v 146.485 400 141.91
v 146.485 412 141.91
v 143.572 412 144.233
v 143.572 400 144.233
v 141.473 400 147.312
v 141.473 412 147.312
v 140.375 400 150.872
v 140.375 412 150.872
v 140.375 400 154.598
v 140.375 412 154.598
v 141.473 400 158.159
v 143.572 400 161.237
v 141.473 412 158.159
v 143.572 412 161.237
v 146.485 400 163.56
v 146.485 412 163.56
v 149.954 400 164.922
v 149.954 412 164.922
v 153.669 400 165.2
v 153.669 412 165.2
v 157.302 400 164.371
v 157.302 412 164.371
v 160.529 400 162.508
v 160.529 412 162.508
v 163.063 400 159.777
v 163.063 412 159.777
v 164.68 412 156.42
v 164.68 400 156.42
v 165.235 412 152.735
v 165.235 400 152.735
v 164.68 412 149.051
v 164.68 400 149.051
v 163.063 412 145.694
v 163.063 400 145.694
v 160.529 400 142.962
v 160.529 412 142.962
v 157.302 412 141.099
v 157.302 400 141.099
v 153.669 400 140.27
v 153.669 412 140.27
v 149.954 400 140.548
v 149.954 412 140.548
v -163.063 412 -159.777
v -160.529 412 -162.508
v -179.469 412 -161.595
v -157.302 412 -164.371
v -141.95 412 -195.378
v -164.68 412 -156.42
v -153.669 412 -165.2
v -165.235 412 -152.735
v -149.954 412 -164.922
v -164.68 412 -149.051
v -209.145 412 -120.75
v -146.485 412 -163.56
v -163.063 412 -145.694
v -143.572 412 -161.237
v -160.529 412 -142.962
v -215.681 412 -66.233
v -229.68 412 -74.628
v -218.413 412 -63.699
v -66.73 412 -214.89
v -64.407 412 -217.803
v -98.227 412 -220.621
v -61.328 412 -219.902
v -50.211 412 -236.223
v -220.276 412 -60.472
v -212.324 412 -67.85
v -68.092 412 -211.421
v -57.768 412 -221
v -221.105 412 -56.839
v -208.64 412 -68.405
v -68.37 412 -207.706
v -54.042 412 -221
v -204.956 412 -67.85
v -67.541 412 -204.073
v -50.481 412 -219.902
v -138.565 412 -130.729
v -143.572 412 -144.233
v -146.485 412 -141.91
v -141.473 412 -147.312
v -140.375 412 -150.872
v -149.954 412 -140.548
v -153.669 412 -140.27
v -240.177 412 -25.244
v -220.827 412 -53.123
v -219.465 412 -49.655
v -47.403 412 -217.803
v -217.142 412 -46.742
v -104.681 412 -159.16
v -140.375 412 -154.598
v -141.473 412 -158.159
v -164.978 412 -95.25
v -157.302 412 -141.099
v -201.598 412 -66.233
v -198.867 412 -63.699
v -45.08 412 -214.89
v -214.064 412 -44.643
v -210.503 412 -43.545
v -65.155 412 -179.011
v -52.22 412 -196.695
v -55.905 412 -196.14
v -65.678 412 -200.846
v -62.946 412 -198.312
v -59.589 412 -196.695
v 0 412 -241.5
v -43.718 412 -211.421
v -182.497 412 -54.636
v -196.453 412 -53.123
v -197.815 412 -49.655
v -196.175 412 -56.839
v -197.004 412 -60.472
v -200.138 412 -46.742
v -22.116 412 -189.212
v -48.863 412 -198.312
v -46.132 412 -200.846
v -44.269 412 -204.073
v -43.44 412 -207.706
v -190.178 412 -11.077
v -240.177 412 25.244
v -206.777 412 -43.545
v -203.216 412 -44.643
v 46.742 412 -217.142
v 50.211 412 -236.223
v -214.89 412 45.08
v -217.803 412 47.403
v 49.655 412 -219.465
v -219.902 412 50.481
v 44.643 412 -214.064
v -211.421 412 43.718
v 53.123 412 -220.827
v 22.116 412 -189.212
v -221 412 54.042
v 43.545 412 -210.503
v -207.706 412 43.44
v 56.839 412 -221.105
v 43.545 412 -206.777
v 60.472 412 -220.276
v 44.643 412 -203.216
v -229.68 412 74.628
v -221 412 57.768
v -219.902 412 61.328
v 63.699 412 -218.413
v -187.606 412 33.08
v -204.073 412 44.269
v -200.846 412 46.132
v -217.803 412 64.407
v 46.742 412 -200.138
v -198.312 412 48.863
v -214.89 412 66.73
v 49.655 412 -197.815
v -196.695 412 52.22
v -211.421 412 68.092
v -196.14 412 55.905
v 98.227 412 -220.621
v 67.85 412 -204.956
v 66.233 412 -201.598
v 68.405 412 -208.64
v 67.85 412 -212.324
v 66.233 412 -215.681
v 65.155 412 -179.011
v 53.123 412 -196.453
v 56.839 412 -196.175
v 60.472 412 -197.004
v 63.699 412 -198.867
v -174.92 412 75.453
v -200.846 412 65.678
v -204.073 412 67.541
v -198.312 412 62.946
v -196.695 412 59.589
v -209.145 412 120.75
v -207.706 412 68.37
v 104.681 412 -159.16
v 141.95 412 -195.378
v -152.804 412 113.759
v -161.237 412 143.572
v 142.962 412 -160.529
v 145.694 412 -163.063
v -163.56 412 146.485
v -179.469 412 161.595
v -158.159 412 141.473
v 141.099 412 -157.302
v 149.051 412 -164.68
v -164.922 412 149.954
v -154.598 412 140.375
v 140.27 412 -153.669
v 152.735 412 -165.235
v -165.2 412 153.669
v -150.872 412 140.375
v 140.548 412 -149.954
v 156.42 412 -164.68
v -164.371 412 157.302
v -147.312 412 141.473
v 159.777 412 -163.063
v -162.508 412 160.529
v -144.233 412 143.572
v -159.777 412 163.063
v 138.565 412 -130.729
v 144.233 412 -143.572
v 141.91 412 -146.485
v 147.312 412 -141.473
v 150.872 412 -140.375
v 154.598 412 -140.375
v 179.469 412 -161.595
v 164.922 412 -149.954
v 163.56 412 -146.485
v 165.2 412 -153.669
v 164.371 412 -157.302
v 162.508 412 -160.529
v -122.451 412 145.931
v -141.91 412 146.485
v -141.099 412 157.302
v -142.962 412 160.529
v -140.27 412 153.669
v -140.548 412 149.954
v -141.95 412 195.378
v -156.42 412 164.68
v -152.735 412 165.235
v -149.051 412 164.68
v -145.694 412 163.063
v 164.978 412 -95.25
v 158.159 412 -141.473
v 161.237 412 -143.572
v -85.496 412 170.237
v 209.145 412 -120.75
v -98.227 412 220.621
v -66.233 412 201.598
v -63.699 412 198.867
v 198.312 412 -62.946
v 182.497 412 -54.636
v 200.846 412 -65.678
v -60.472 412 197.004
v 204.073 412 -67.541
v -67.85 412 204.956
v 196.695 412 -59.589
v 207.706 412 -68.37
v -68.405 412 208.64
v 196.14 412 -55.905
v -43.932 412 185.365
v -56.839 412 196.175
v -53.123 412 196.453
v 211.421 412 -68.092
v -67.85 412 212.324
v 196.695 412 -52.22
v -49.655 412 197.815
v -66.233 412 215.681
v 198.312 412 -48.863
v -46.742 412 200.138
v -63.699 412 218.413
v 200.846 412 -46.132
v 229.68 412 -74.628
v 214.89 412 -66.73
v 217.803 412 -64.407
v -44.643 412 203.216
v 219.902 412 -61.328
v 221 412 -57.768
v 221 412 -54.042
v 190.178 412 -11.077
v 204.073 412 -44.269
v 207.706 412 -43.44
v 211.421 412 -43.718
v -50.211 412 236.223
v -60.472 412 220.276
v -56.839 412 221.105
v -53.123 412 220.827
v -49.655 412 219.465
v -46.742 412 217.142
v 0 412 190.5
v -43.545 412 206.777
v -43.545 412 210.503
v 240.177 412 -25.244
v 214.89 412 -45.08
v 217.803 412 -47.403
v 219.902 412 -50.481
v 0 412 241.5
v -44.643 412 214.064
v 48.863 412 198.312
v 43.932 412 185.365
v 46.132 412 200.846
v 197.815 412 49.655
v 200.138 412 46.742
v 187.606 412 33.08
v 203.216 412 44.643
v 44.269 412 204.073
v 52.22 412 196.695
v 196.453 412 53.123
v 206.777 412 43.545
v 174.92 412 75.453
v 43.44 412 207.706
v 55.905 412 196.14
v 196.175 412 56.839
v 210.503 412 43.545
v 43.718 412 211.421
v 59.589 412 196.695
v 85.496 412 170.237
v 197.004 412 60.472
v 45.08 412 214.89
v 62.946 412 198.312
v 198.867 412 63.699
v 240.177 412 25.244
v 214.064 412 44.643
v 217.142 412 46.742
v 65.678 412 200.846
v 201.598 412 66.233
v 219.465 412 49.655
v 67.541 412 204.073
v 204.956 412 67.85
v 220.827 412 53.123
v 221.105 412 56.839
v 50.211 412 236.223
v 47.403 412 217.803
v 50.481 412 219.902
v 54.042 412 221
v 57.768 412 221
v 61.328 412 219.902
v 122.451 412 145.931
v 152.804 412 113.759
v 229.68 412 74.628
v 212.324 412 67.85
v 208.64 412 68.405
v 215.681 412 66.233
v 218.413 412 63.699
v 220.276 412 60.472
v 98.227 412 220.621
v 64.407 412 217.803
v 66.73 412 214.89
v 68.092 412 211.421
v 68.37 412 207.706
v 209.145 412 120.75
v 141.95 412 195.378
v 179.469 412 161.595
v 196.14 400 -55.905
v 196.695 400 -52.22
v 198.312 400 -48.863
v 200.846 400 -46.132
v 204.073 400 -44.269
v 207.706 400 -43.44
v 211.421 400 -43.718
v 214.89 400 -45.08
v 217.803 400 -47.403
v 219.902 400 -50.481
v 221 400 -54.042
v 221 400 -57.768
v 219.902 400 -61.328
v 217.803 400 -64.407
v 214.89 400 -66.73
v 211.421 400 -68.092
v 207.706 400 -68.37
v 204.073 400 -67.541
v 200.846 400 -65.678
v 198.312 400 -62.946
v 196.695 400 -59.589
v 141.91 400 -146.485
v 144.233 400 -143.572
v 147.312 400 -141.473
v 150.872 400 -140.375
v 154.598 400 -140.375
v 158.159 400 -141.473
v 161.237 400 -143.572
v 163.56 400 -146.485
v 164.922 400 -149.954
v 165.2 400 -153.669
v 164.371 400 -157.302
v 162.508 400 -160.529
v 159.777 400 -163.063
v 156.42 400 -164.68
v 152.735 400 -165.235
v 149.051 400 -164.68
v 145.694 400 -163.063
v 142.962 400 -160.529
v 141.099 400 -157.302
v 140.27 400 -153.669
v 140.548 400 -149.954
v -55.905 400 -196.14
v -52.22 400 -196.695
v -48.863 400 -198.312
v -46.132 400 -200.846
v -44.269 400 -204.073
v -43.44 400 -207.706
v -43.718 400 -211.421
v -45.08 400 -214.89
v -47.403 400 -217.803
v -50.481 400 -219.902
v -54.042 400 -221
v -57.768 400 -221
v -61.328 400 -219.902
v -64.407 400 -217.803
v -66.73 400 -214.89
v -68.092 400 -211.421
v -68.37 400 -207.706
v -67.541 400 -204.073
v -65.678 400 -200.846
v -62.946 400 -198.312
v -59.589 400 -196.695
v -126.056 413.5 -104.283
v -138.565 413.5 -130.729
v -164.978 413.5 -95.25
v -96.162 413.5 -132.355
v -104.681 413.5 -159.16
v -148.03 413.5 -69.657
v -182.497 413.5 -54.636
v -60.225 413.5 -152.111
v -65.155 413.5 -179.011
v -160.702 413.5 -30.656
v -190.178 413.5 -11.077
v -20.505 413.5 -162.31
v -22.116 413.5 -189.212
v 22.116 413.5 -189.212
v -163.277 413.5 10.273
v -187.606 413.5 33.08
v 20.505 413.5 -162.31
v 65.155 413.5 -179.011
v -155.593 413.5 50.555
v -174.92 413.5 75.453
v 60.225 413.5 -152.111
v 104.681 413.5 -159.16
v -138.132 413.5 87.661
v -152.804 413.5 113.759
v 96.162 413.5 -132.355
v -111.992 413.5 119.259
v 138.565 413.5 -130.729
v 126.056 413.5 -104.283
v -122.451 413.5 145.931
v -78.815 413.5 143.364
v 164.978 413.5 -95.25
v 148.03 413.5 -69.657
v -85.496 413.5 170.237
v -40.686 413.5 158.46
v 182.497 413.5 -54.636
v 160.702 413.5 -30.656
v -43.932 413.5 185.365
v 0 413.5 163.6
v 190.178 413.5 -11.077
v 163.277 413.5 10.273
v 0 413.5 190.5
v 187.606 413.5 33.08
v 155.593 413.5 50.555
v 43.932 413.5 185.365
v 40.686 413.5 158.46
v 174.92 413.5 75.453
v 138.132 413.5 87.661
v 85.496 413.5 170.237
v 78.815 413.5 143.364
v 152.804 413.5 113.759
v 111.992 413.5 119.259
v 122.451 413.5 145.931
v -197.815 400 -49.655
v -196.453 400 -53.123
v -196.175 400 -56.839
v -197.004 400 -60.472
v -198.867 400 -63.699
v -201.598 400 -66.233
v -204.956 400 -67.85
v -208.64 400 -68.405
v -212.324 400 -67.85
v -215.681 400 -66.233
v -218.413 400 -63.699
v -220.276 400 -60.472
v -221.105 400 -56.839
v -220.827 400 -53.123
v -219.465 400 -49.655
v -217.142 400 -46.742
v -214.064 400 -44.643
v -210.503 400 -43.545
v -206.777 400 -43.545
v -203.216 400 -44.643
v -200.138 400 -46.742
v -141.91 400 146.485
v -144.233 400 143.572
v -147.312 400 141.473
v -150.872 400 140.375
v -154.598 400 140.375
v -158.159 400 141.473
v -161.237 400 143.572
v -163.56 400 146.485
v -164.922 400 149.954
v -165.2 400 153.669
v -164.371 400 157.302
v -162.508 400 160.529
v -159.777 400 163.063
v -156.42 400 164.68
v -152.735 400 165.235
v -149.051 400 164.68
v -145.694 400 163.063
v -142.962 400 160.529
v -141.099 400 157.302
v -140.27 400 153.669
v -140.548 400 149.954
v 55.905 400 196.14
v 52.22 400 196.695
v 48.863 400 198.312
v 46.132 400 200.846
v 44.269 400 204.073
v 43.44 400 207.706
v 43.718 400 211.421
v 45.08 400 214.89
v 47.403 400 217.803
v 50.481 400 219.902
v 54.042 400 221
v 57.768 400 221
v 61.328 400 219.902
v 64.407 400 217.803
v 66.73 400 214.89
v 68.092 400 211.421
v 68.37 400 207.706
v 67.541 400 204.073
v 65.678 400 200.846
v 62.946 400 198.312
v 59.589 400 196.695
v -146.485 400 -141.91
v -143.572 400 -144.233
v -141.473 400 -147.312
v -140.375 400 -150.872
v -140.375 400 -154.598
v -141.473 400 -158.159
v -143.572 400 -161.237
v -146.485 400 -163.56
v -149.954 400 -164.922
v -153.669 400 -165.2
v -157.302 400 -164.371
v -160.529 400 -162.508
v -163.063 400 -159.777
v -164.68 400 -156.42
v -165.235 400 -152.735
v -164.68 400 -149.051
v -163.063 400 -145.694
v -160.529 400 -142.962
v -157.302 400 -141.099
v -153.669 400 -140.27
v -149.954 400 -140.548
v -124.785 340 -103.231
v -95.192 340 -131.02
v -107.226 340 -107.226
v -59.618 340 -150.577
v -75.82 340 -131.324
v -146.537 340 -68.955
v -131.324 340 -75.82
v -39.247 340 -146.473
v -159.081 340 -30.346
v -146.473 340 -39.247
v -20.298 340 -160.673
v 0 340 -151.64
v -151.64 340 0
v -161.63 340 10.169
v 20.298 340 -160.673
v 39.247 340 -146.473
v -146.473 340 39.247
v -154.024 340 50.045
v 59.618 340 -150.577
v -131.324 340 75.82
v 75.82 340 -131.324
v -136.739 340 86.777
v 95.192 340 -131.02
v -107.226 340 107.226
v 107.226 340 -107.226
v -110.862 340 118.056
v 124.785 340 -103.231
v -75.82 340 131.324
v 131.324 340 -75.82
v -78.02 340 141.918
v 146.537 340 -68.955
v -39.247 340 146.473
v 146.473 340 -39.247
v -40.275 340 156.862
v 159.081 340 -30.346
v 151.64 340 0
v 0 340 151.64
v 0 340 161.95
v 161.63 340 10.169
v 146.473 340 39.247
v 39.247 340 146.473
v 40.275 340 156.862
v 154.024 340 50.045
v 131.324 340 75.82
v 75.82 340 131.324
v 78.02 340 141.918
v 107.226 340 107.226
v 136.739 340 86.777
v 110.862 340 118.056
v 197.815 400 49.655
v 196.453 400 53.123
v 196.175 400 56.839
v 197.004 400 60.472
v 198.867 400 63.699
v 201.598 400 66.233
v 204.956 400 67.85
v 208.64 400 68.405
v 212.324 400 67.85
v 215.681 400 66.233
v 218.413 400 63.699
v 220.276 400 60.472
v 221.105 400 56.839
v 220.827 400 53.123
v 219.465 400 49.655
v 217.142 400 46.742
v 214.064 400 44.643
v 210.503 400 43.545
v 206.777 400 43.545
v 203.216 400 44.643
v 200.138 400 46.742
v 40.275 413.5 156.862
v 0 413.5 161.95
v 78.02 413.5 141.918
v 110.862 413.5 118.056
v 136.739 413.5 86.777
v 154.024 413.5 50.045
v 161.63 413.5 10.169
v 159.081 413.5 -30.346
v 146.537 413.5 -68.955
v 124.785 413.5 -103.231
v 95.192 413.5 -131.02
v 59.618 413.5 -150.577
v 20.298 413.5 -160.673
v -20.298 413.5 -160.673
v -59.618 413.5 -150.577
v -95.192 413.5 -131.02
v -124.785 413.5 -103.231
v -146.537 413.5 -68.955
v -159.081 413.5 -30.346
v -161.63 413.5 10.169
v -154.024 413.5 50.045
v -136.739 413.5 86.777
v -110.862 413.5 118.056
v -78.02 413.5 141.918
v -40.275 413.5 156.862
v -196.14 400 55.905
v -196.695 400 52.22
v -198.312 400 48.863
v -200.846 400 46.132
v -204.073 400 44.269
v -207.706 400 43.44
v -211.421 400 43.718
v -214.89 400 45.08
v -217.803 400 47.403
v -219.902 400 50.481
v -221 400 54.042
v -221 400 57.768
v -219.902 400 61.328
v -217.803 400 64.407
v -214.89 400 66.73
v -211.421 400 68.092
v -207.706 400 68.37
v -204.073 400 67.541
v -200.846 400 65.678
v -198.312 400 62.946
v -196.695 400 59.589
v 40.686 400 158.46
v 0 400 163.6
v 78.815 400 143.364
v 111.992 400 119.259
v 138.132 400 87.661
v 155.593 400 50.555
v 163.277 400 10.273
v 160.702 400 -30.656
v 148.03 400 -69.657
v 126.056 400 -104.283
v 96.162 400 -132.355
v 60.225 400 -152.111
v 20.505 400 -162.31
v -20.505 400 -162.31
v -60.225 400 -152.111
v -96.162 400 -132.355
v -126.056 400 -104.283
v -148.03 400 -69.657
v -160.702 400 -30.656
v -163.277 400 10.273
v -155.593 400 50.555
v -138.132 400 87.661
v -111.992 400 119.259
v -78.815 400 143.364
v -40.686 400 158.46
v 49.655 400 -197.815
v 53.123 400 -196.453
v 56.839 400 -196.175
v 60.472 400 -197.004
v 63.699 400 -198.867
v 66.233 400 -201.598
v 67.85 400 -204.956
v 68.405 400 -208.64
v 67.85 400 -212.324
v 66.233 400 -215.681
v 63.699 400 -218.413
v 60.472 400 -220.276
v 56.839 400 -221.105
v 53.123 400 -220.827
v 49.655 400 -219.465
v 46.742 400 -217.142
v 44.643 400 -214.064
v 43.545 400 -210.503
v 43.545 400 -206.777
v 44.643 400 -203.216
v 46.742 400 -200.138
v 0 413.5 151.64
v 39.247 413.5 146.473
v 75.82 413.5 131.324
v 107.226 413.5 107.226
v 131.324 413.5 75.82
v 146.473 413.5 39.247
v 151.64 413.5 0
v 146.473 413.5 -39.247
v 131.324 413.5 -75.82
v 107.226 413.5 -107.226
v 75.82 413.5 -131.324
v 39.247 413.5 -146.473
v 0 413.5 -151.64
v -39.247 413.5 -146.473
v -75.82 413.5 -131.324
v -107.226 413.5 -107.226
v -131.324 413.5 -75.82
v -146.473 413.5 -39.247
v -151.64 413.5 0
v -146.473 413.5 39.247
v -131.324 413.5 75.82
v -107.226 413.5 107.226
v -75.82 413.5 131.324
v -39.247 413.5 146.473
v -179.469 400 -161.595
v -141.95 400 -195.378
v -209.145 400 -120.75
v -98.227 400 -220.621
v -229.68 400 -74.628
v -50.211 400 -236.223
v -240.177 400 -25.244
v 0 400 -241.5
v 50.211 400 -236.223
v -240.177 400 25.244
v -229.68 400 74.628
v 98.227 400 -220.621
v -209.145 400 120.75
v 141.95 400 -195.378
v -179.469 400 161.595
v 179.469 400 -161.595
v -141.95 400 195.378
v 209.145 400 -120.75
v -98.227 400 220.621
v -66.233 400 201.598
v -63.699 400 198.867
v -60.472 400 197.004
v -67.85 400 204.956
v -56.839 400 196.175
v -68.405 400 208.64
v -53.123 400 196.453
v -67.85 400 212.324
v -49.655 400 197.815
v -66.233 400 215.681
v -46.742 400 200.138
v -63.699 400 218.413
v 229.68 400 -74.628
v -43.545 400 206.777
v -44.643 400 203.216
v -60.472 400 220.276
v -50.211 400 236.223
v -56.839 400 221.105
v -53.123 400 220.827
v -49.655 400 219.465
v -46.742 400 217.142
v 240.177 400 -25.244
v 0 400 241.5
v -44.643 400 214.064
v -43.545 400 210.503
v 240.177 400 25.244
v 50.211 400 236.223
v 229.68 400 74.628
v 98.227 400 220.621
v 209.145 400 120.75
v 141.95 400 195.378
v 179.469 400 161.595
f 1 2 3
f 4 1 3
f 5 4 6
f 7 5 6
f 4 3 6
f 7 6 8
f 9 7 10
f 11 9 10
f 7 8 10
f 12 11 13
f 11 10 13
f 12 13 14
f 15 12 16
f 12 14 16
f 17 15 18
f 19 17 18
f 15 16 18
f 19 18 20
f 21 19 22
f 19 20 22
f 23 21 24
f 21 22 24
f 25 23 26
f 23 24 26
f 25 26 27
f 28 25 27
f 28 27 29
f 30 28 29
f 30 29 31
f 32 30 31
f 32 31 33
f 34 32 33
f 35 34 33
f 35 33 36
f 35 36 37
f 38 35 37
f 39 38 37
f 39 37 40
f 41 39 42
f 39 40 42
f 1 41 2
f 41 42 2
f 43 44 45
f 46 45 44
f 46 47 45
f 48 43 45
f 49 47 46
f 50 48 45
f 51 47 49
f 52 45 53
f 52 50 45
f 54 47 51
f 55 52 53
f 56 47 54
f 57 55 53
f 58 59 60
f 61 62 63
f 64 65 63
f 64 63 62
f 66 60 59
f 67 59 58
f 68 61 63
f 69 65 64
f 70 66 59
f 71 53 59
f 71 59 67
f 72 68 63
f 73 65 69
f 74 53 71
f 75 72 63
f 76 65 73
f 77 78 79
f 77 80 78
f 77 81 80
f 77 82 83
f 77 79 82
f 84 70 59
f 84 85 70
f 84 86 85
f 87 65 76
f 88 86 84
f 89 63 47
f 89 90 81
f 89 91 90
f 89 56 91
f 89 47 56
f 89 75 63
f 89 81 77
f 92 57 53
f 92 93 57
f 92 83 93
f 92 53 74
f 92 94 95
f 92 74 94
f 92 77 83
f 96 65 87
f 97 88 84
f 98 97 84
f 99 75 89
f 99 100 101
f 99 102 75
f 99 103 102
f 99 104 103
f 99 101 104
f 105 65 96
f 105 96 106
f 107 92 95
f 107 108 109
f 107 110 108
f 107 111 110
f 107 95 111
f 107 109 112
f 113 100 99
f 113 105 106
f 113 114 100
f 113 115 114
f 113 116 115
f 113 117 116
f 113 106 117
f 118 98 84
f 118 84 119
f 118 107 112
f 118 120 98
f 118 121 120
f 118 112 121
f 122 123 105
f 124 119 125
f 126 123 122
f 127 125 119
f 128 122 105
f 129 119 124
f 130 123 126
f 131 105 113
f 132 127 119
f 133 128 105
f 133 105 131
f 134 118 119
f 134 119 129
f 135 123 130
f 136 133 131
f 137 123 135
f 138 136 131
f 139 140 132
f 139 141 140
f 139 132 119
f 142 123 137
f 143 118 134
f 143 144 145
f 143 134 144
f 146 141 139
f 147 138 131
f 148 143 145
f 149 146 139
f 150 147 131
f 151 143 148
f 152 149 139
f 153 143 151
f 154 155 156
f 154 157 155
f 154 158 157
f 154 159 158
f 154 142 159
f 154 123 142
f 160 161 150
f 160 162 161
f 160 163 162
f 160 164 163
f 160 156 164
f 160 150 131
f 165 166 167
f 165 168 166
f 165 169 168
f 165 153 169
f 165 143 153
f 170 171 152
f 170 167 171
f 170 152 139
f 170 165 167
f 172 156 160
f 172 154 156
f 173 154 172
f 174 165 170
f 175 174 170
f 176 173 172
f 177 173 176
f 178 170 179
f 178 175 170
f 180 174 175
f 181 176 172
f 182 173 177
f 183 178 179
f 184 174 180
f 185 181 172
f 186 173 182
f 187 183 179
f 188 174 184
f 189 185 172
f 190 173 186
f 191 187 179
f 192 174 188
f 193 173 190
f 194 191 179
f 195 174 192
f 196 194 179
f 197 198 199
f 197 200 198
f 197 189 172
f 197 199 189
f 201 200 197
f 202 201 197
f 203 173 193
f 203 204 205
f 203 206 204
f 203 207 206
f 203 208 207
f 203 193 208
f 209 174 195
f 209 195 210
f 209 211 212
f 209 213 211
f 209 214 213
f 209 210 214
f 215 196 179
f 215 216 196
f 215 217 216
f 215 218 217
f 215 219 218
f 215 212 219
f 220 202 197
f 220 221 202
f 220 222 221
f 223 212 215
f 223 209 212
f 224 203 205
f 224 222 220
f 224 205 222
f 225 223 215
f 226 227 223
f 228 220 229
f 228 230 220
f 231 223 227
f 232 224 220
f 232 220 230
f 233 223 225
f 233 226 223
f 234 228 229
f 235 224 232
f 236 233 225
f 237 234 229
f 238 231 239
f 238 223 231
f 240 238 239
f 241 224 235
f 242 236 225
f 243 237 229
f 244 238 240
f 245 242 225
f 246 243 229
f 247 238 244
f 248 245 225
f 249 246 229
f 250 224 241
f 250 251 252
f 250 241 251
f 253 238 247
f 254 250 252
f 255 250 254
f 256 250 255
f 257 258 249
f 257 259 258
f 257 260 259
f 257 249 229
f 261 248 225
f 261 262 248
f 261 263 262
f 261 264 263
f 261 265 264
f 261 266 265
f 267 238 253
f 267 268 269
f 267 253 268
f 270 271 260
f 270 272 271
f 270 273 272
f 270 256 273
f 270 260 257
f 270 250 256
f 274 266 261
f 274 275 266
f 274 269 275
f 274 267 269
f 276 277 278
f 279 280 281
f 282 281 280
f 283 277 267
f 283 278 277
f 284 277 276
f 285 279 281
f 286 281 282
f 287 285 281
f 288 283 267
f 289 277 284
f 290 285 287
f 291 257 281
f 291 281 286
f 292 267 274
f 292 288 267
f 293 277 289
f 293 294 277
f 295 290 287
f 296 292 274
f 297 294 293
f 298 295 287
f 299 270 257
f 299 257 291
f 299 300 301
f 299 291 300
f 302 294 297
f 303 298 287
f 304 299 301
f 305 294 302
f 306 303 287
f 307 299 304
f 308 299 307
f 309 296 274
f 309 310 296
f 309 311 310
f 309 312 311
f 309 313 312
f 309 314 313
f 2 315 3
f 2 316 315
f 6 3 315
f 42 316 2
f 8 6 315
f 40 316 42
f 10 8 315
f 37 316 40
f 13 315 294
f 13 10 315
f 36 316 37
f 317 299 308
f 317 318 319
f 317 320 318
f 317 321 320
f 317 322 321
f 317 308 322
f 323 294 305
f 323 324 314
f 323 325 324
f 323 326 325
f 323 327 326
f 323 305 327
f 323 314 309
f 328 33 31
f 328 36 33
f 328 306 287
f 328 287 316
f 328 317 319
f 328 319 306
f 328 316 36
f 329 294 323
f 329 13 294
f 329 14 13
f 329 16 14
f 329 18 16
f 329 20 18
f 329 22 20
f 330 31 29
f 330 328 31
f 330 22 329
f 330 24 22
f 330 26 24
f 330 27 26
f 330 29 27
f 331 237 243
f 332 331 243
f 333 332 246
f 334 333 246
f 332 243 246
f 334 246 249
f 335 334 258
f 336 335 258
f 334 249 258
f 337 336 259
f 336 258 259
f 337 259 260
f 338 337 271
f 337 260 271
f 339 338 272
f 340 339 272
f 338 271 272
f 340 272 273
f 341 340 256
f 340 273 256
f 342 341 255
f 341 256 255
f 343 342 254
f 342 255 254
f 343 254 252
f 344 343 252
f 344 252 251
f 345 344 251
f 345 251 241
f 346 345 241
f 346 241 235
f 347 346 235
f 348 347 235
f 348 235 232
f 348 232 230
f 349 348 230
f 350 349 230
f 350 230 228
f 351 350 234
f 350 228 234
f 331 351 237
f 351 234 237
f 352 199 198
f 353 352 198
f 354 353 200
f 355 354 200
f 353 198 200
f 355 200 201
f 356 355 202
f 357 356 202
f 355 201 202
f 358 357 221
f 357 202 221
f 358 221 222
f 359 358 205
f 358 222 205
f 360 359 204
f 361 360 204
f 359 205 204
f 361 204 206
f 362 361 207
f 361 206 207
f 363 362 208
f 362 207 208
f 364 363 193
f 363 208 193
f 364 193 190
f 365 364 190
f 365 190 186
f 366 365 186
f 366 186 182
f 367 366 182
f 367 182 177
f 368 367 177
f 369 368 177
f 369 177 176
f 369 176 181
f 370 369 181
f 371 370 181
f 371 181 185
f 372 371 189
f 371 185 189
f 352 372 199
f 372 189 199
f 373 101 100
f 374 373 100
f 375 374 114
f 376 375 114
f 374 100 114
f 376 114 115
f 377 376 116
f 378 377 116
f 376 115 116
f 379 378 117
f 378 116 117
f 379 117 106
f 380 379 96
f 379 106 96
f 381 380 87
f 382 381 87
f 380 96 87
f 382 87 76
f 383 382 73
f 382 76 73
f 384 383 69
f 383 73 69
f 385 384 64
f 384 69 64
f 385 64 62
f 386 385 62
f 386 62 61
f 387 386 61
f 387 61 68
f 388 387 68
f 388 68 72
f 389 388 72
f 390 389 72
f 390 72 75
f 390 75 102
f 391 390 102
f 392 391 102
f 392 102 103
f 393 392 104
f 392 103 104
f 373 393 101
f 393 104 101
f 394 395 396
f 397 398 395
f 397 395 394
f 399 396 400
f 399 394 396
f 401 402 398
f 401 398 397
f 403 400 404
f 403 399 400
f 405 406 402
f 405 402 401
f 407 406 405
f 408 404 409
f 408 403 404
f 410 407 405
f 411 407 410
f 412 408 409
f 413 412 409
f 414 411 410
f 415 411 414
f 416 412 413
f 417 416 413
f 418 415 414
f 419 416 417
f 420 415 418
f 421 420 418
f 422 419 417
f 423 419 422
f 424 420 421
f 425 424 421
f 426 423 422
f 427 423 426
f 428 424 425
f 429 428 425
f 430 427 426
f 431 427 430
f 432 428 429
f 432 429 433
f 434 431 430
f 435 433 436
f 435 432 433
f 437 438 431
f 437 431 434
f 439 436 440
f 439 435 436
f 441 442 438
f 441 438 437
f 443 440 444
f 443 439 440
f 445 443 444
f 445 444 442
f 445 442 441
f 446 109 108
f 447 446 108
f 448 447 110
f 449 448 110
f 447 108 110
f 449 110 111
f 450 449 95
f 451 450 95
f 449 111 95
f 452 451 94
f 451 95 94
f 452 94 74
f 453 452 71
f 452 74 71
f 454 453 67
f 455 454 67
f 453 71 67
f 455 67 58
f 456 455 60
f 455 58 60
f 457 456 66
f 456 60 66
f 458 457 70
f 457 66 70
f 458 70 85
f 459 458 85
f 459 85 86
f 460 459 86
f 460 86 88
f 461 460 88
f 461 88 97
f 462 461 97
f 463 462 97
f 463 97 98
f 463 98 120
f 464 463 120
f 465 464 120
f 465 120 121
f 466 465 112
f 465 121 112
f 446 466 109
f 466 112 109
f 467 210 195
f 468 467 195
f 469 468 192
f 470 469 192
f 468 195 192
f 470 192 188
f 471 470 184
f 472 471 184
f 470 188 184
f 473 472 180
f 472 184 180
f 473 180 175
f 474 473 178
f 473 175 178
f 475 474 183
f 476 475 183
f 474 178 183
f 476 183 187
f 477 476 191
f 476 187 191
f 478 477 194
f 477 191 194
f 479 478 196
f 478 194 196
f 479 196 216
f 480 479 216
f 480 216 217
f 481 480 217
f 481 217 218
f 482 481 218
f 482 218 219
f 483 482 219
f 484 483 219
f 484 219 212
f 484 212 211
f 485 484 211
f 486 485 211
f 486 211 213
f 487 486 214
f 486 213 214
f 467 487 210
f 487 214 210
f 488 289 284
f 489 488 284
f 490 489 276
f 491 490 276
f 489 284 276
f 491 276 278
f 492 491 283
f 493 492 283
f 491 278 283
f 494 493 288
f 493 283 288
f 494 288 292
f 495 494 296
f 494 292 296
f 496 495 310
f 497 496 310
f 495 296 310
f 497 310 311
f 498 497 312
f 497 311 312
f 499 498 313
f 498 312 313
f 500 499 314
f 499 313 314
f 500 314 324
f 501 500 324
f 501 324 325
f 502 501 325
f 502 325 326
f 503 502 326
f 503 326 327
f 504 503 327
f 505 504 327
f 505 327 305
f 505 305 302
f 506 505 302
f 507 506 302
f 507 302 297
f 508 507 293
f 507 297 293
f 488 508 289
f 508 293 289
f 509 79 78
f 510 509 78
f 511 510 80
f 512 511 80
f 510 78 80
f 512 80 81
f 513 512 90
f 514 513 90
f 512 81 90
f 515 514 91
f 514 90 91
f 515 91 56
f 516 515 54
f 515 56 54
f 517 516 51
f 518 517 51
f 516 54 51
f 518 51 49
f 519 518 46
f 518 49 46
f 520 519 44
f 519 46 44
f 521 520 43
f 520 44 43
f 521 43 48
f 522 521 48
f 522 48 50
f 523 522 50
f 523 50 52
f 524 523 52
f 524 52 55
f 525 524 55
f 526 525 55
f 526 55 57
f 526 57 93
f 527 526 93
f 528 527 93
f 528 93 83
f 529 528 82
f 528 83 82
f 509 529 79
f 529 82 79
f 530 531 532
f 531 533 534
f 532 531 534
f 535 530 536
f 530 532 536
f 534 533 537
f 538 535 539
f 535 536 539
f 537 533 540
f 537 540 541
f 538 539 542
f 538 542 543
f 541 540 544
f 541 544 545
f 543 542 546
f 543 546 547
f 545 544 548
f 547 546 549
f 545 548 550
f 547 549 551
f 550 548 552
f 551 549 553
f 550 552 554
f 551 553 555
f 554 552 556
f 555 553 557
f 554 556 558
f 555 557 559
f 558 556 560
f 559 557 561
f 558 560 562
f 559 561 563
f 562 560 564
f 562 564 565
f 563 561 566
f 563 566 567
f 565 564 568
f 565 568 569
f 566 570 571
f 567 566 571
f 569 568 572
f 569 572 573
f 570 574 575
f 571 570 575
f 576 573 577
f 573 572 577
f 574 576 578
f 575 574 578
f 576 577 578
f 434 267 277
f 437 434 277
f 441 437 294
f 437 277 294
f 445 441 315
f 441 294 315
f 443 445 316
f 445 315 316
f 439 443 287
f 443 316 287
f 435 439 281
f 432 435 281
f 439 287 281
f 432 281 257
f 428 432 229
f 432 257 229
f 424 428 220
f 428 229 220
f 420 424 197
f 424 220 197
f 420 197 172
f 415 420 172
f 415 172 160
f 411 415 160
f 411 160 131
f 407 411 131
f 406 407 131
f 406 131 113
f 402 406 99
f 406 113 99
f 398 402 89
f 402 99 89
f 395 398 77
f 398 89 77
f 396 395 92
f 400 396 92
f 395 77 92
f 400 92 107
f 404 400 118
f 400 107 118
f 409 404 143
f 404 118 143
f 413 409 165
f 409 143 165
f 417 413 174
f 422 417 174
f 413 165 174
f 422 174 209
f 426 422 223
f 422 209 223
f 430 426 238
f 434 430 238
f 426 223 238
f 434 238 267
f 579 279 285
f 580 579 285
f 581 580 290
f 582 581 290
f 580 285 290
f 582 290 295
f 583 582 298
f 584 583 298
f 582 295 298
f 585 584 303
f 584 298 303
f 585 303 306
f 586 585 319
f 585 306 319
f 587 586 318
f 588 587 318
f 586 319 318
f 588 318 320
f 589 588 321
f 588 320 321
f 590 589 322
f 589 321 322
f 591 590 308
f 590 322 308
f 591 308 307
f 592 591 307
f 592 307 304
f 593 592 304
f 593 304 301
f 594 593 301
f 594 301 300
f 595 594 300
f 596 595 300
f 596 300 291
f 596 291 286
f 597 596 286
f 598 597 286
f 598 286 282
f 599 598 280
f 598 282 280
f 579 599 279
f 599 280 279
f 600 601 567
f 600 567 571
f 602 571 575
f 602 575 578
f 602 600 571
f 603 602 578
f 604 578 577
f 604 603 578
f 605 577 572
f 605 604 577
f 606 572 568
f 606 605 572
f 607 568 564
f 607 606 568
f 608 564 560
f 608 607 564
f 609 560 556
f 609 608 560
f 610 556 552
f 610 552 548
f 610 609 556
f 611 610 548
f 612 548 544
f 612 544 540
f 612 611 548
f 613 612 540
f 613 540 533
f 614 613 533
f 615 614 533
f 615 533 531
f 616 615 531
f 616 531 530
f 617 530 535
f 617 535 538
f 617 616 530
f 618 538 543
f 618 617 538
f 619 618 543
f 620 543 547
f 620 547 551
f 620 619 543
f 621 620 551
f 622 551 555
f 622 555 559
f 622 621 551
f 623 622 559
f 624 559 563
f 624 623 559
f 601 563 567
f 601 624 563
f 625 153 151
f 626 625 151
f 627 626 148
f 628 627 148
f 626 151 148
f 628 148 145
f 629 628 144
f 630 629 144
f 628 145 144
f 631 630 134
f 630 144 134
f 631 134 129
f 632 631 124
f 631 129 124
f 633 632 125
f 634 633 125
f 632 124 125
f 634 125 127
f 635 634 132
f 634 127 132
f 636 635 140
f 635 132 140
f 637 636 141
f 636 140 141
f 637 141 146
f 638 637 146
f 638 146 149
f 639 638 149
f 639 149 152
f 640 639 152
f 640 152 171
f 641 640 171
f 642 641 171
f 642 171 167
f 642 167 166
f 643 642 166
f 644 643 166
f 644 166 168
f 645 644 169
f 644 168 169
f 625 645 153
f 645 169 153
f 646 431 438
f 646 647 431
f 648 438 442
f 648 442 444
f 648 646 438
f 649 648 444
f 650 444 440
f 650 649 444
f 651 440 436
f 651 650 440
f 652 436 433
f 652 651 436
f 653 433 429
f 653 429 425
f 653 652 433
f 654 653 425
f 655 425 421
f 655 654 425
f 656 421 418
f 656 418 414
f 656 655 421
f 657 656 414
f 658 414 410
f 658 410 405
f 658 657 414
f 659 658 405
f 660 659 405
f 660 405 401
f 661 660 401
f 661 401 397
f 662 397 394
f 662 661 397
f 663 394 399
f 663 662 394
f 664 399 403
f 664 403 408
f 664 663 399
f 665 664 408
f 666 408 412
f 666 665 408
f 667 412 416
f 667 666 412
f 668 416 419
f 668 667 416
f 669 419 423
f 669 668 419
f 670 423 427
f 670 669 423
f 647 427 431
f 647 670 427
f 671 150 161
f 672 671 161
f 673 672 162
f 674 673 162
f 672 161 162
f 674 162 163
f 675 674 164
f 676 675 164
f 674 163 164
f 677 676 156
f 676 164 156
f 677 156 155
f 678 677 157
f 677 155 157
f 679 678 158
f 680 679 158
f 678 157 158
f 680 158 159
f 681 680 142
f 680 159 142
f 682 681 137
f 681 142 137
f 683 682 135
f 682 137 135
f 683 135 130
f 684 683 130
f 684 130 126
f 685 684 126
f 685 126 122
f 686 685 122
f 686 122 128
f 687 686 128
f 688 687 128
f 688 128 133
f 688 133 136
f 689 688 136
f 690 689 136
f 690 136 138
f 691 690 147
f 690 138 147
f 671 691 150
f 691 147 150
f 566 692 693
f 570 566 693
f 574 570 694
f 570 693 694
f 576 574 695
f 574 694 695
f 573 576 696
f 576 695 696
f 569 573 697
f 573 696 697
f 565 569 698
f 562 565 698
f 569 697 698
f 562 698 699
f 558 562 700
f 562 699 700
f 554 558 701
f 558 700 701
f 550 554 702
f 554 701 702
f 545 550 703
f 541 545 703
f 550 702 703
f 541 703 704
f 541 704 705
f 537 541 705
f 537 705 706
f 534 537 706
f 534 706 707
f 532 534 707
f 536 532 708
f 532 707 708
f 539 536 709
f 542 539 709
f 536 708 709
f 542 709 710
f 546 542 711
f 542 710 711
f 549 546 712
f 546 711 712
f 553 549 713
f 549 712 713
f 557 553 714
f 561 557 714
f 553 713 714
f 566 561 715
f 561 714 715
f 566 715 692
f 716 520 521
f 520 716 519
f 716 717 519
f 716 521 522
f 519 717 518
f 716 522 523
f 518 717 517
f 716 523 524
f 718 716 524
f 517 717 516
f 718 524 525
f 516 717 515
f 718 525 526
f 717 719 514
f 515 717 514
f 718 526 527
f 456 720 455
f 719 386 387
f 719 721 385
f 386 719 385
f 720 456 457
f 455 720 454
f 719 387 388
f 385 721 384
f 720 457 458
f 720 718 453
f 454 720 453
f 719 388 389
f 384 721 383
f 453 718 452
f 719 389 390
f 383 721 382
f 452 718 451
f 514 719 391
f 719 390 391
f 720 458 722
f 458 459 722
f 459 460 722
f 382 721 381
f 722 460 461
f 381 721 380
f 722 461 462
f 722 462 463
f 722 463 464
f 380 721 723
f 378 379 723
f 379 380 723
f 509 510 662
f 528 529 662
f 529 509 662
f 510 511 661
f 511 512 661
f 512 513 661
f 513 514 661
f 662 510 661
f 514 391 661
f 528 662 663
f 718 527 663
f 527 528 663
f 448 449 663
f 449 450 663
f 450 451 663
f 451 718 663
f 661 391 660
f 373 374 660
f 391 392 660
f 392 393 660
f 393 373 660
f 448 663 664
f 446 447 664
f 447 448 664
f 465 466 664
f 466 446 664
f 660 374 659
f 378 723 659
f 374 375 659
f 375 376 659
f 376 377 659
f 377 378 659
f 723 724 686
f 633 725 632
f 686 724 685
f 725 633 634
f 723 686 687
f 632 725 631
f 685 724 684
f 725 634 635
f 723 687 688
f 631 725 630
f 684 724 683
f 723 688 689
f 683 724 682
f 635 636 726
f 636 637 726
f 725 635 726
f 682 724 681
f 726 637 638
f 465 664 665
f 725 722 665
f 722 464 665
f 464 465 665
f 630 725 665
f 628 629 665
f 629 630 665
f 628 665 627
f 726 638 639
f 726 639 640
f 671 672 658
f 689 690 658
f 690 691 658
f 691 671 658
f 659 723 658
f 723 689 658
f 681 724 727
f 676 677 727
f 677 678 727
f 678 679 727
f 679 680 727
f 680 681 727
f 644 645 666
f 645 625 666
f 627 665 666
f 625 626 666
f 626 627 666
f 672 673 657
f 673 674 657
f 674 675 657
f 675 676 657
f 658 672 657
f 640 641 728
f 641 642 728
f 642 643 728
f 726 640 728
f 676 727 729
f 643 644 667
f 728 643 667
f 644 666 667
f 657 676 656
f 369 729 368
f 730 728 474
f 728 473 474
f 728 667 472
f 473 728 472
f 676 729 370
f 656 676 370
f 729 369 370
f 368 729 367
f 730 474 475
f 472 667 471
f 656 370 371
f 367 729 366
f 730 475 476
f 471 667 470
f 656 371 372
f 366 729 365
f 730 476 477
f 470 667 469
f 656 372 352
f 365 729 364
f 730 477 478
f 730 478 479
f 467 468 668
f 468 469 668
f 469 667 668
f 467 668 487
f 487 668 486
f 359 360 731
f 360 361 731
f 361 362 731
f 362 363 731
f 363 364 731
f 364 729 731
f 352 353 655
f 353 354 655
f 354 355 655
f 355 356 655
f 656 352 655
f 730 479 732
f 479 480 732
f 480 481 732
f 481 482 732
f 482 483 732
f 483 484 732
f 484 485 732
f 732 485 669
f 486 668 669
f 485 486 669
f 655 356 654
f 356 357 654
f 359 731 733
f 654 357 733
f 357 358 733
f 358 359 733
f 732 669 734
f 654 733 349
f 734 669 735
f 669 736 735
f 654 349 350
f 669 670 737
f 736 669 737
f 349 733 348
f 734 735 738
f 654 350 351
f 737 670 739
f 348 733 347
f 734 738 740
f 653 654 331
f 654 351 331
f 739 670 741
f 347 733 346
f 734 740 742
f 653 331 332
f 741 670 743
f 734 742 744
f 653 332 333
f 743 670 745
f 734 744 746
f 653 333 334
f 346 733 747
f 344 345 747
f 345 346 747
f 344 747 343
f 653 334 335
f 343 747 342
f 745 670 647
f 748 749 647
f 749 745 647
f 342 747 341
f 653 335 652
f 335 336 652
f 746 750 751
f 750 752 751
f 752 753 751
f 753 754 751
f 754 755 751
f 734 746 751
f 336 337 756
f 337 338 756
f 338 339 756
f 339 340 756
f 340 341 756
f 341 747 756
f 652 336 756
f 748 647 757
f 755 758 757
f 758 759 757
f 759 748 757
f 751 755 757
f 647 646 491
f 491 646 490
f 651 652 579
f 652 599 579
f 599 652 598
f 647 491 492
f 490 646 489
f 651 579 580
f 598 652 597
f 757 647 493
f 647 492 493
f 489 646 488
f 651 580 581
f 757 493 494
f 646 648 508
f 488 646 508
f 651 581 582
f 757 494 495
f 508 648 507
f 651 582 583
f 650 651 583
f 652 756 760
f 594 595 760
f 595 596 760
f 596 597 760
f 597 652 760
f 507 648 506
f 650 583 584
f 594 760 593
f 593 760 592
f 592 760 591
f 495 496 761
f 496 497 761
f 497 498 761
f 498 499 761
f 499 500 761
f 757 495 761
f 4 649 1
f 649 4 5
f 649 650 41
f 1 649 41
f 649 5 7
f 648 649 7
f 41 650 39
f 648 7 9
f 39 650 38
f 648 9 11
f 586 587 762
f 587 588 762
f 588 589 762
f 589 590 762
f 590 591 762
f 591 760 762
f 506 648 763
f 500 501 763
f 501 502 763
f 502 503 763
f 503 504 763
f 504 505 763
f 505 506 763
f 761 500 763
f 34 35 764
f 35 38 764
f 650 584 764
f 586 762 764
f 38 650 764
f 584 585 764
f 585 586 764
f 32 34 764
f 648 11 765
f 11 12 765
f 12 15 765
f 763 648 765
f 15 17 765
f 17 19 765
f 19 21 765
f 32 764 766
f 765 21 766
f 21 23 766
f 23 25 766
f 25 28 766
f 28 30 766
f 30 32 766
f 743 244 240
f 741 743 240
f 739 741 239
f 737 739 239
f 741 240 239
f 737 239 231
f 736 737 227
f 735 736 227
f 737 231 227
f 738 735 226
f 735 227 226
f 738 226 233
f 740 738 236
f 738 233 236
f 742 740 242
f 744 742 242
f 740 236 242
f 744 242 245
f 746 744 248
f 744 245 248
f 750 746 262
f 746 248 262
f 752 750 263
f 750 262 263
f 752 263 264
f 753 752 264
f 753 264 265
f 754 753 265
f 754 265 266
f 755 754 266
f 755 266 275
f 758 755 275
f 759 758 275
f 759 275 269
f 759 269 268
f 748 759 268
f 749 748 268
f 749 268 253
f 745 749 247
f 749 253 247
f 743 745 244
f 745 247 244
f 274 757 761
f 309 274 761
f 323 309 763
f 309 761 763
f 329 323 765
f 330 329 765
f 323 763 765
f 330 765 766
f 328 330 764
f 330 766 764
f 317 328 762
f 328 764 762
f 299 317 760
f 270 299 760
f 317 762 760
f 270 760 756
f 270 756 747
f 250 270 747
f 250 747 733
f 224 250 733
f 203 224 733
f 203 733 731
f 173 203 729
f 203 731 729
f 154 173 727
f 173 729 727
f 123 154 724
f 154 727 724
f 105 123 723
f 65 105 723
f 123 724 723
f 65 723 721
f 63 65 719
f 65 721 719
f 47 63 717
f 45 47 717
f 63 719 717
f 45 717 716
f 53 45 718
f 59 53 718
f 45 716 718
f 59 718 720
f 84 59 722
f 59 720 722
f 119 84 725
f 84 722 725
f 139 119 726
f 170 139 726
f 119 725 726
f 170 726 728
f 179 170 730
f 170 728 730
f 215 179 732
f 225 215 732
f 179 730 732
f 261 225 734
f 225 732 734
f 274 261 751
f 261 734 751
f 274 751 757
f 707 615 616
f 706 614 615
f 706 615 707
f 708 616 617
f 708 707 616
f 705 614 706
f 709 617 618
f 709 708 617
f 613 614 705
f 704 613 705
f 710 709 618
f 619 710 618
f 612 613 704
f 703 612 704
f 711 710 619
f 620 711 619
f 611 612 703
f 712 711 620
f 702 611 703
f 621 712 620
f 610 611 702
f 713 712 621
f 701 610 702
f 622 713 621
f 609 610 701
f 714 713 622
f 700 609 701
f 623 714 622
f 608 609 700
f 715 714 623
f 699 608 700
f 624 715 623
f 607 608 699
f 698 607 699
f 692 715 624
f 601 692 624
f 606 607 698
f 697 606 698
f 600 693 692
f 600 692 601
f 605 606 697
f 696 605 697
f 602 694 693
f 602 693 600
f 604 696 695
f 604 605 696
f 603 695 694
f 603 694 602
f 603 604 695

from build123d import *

# Parameters (mm, degrees)
SKETCH9_R           = 241.5
SKETCH9_R_2         = 163.6
BOSS_EXTRUDE1_DEPTH = 12
SKETCH10_R          = 12.5
CUT_EXTRUDE1_DEPTH  = 12
CIRPATTERN1_COUNT   = 12
SKETCH11_R          = 190.5
SKETCH11_R_2        = 163.6
BOSS_EXTRUDE2_DEPTH = 1.5
SKETCH12_R          = 161.95
SKETCH12_R_2        = 151.64
BOSS_EXTRUDE3_DEPTH = 73.5


with BuildPart() as part:
    # Sketch9 → Boss-Extrude1 (new body)
    with BuildSketch(Plane(origin=(0, 400, 0), x_dir=(1, 0, 0), z_dir=(0, 1, 0))):
        with Locations(Location((0, 0, 0), (0, 0, 270))):
            Circle(SKETCH9_R)
        with Locations(Location((0, 0, 0), (0, 0, 270))):
            Circle(SKETCH9_R_2, mode=Mode.SUBTRACT)
    extrude(amount=BOSS_EXTRUDE1_DEPTH)

    # Sketch10 → Cut-Extrude1 (cut)
    with BuildSketch(Plane(origin=(0, 412, 0), x_dir=(1, 0, 0), z_dir=(0, 1, 0))):
        with Locations(Location((-55.904913742, 208.639978478, 0), (0, 0, 270))):
            Circle(SKETCH10_R)
    cut_extrude1 = extrude(amount=-CUT_EXTRUDE1_DEPTH, mode=Mode.SUBTRACT)

    # CirPattern1: Cut-Extrude1 ×12 about axis
    cirpattern1_axis = Axis((0, 0, 0), (0, 1, 0))
    for i in range(1, CIRPATTERN1_COUNT):
        add(cut_extrude1.rotate(cirpattern1_axis, i * 360 / CIRPATTERN1_COUNT), mode=Mode.SUBTRACT)

    # Sketch11 → Boss-Extrude2 (add)
    with BuildSketch(Plane(origin=(0, 412, 0), x_dir=(1, 0, 0), z_dir=(0, 1, 0))):
        with Locations(Location((0, 0, 0), (0, 0, 270))):
            Circle(SKETCH11_R)
        with Locations(Location((0, 0, 0), (0, 0, 270))):
            Circle(SKETCH11_R_2, mode=Mode.SUBTRACT)
    extrude(amount=BOSS_EXTRUDE2_DEPTH)


with BuildPart() as body_2:
    # Sketch12 → Boss-Extrude3 (new body)
    with BuildSketch(Plane(origin=(0, 413.5, 0), x_dir=(1, 0, 0), z_dir=(0, 1, 0))):
        with Locations(Location((0, 0, 0), (0, 0, 270))):
            Circle(SKETCH12_R)
        with Locations(Location((0, 0, 0), (0, 0, 270))):
            Circle(SKETCH12_R_2, mode=Mode.SUBTRACT)
    extrude(amount=-BOSS_EXTRUDE3_DEPTH)


solid = Compound([part.part, body_2.part])
